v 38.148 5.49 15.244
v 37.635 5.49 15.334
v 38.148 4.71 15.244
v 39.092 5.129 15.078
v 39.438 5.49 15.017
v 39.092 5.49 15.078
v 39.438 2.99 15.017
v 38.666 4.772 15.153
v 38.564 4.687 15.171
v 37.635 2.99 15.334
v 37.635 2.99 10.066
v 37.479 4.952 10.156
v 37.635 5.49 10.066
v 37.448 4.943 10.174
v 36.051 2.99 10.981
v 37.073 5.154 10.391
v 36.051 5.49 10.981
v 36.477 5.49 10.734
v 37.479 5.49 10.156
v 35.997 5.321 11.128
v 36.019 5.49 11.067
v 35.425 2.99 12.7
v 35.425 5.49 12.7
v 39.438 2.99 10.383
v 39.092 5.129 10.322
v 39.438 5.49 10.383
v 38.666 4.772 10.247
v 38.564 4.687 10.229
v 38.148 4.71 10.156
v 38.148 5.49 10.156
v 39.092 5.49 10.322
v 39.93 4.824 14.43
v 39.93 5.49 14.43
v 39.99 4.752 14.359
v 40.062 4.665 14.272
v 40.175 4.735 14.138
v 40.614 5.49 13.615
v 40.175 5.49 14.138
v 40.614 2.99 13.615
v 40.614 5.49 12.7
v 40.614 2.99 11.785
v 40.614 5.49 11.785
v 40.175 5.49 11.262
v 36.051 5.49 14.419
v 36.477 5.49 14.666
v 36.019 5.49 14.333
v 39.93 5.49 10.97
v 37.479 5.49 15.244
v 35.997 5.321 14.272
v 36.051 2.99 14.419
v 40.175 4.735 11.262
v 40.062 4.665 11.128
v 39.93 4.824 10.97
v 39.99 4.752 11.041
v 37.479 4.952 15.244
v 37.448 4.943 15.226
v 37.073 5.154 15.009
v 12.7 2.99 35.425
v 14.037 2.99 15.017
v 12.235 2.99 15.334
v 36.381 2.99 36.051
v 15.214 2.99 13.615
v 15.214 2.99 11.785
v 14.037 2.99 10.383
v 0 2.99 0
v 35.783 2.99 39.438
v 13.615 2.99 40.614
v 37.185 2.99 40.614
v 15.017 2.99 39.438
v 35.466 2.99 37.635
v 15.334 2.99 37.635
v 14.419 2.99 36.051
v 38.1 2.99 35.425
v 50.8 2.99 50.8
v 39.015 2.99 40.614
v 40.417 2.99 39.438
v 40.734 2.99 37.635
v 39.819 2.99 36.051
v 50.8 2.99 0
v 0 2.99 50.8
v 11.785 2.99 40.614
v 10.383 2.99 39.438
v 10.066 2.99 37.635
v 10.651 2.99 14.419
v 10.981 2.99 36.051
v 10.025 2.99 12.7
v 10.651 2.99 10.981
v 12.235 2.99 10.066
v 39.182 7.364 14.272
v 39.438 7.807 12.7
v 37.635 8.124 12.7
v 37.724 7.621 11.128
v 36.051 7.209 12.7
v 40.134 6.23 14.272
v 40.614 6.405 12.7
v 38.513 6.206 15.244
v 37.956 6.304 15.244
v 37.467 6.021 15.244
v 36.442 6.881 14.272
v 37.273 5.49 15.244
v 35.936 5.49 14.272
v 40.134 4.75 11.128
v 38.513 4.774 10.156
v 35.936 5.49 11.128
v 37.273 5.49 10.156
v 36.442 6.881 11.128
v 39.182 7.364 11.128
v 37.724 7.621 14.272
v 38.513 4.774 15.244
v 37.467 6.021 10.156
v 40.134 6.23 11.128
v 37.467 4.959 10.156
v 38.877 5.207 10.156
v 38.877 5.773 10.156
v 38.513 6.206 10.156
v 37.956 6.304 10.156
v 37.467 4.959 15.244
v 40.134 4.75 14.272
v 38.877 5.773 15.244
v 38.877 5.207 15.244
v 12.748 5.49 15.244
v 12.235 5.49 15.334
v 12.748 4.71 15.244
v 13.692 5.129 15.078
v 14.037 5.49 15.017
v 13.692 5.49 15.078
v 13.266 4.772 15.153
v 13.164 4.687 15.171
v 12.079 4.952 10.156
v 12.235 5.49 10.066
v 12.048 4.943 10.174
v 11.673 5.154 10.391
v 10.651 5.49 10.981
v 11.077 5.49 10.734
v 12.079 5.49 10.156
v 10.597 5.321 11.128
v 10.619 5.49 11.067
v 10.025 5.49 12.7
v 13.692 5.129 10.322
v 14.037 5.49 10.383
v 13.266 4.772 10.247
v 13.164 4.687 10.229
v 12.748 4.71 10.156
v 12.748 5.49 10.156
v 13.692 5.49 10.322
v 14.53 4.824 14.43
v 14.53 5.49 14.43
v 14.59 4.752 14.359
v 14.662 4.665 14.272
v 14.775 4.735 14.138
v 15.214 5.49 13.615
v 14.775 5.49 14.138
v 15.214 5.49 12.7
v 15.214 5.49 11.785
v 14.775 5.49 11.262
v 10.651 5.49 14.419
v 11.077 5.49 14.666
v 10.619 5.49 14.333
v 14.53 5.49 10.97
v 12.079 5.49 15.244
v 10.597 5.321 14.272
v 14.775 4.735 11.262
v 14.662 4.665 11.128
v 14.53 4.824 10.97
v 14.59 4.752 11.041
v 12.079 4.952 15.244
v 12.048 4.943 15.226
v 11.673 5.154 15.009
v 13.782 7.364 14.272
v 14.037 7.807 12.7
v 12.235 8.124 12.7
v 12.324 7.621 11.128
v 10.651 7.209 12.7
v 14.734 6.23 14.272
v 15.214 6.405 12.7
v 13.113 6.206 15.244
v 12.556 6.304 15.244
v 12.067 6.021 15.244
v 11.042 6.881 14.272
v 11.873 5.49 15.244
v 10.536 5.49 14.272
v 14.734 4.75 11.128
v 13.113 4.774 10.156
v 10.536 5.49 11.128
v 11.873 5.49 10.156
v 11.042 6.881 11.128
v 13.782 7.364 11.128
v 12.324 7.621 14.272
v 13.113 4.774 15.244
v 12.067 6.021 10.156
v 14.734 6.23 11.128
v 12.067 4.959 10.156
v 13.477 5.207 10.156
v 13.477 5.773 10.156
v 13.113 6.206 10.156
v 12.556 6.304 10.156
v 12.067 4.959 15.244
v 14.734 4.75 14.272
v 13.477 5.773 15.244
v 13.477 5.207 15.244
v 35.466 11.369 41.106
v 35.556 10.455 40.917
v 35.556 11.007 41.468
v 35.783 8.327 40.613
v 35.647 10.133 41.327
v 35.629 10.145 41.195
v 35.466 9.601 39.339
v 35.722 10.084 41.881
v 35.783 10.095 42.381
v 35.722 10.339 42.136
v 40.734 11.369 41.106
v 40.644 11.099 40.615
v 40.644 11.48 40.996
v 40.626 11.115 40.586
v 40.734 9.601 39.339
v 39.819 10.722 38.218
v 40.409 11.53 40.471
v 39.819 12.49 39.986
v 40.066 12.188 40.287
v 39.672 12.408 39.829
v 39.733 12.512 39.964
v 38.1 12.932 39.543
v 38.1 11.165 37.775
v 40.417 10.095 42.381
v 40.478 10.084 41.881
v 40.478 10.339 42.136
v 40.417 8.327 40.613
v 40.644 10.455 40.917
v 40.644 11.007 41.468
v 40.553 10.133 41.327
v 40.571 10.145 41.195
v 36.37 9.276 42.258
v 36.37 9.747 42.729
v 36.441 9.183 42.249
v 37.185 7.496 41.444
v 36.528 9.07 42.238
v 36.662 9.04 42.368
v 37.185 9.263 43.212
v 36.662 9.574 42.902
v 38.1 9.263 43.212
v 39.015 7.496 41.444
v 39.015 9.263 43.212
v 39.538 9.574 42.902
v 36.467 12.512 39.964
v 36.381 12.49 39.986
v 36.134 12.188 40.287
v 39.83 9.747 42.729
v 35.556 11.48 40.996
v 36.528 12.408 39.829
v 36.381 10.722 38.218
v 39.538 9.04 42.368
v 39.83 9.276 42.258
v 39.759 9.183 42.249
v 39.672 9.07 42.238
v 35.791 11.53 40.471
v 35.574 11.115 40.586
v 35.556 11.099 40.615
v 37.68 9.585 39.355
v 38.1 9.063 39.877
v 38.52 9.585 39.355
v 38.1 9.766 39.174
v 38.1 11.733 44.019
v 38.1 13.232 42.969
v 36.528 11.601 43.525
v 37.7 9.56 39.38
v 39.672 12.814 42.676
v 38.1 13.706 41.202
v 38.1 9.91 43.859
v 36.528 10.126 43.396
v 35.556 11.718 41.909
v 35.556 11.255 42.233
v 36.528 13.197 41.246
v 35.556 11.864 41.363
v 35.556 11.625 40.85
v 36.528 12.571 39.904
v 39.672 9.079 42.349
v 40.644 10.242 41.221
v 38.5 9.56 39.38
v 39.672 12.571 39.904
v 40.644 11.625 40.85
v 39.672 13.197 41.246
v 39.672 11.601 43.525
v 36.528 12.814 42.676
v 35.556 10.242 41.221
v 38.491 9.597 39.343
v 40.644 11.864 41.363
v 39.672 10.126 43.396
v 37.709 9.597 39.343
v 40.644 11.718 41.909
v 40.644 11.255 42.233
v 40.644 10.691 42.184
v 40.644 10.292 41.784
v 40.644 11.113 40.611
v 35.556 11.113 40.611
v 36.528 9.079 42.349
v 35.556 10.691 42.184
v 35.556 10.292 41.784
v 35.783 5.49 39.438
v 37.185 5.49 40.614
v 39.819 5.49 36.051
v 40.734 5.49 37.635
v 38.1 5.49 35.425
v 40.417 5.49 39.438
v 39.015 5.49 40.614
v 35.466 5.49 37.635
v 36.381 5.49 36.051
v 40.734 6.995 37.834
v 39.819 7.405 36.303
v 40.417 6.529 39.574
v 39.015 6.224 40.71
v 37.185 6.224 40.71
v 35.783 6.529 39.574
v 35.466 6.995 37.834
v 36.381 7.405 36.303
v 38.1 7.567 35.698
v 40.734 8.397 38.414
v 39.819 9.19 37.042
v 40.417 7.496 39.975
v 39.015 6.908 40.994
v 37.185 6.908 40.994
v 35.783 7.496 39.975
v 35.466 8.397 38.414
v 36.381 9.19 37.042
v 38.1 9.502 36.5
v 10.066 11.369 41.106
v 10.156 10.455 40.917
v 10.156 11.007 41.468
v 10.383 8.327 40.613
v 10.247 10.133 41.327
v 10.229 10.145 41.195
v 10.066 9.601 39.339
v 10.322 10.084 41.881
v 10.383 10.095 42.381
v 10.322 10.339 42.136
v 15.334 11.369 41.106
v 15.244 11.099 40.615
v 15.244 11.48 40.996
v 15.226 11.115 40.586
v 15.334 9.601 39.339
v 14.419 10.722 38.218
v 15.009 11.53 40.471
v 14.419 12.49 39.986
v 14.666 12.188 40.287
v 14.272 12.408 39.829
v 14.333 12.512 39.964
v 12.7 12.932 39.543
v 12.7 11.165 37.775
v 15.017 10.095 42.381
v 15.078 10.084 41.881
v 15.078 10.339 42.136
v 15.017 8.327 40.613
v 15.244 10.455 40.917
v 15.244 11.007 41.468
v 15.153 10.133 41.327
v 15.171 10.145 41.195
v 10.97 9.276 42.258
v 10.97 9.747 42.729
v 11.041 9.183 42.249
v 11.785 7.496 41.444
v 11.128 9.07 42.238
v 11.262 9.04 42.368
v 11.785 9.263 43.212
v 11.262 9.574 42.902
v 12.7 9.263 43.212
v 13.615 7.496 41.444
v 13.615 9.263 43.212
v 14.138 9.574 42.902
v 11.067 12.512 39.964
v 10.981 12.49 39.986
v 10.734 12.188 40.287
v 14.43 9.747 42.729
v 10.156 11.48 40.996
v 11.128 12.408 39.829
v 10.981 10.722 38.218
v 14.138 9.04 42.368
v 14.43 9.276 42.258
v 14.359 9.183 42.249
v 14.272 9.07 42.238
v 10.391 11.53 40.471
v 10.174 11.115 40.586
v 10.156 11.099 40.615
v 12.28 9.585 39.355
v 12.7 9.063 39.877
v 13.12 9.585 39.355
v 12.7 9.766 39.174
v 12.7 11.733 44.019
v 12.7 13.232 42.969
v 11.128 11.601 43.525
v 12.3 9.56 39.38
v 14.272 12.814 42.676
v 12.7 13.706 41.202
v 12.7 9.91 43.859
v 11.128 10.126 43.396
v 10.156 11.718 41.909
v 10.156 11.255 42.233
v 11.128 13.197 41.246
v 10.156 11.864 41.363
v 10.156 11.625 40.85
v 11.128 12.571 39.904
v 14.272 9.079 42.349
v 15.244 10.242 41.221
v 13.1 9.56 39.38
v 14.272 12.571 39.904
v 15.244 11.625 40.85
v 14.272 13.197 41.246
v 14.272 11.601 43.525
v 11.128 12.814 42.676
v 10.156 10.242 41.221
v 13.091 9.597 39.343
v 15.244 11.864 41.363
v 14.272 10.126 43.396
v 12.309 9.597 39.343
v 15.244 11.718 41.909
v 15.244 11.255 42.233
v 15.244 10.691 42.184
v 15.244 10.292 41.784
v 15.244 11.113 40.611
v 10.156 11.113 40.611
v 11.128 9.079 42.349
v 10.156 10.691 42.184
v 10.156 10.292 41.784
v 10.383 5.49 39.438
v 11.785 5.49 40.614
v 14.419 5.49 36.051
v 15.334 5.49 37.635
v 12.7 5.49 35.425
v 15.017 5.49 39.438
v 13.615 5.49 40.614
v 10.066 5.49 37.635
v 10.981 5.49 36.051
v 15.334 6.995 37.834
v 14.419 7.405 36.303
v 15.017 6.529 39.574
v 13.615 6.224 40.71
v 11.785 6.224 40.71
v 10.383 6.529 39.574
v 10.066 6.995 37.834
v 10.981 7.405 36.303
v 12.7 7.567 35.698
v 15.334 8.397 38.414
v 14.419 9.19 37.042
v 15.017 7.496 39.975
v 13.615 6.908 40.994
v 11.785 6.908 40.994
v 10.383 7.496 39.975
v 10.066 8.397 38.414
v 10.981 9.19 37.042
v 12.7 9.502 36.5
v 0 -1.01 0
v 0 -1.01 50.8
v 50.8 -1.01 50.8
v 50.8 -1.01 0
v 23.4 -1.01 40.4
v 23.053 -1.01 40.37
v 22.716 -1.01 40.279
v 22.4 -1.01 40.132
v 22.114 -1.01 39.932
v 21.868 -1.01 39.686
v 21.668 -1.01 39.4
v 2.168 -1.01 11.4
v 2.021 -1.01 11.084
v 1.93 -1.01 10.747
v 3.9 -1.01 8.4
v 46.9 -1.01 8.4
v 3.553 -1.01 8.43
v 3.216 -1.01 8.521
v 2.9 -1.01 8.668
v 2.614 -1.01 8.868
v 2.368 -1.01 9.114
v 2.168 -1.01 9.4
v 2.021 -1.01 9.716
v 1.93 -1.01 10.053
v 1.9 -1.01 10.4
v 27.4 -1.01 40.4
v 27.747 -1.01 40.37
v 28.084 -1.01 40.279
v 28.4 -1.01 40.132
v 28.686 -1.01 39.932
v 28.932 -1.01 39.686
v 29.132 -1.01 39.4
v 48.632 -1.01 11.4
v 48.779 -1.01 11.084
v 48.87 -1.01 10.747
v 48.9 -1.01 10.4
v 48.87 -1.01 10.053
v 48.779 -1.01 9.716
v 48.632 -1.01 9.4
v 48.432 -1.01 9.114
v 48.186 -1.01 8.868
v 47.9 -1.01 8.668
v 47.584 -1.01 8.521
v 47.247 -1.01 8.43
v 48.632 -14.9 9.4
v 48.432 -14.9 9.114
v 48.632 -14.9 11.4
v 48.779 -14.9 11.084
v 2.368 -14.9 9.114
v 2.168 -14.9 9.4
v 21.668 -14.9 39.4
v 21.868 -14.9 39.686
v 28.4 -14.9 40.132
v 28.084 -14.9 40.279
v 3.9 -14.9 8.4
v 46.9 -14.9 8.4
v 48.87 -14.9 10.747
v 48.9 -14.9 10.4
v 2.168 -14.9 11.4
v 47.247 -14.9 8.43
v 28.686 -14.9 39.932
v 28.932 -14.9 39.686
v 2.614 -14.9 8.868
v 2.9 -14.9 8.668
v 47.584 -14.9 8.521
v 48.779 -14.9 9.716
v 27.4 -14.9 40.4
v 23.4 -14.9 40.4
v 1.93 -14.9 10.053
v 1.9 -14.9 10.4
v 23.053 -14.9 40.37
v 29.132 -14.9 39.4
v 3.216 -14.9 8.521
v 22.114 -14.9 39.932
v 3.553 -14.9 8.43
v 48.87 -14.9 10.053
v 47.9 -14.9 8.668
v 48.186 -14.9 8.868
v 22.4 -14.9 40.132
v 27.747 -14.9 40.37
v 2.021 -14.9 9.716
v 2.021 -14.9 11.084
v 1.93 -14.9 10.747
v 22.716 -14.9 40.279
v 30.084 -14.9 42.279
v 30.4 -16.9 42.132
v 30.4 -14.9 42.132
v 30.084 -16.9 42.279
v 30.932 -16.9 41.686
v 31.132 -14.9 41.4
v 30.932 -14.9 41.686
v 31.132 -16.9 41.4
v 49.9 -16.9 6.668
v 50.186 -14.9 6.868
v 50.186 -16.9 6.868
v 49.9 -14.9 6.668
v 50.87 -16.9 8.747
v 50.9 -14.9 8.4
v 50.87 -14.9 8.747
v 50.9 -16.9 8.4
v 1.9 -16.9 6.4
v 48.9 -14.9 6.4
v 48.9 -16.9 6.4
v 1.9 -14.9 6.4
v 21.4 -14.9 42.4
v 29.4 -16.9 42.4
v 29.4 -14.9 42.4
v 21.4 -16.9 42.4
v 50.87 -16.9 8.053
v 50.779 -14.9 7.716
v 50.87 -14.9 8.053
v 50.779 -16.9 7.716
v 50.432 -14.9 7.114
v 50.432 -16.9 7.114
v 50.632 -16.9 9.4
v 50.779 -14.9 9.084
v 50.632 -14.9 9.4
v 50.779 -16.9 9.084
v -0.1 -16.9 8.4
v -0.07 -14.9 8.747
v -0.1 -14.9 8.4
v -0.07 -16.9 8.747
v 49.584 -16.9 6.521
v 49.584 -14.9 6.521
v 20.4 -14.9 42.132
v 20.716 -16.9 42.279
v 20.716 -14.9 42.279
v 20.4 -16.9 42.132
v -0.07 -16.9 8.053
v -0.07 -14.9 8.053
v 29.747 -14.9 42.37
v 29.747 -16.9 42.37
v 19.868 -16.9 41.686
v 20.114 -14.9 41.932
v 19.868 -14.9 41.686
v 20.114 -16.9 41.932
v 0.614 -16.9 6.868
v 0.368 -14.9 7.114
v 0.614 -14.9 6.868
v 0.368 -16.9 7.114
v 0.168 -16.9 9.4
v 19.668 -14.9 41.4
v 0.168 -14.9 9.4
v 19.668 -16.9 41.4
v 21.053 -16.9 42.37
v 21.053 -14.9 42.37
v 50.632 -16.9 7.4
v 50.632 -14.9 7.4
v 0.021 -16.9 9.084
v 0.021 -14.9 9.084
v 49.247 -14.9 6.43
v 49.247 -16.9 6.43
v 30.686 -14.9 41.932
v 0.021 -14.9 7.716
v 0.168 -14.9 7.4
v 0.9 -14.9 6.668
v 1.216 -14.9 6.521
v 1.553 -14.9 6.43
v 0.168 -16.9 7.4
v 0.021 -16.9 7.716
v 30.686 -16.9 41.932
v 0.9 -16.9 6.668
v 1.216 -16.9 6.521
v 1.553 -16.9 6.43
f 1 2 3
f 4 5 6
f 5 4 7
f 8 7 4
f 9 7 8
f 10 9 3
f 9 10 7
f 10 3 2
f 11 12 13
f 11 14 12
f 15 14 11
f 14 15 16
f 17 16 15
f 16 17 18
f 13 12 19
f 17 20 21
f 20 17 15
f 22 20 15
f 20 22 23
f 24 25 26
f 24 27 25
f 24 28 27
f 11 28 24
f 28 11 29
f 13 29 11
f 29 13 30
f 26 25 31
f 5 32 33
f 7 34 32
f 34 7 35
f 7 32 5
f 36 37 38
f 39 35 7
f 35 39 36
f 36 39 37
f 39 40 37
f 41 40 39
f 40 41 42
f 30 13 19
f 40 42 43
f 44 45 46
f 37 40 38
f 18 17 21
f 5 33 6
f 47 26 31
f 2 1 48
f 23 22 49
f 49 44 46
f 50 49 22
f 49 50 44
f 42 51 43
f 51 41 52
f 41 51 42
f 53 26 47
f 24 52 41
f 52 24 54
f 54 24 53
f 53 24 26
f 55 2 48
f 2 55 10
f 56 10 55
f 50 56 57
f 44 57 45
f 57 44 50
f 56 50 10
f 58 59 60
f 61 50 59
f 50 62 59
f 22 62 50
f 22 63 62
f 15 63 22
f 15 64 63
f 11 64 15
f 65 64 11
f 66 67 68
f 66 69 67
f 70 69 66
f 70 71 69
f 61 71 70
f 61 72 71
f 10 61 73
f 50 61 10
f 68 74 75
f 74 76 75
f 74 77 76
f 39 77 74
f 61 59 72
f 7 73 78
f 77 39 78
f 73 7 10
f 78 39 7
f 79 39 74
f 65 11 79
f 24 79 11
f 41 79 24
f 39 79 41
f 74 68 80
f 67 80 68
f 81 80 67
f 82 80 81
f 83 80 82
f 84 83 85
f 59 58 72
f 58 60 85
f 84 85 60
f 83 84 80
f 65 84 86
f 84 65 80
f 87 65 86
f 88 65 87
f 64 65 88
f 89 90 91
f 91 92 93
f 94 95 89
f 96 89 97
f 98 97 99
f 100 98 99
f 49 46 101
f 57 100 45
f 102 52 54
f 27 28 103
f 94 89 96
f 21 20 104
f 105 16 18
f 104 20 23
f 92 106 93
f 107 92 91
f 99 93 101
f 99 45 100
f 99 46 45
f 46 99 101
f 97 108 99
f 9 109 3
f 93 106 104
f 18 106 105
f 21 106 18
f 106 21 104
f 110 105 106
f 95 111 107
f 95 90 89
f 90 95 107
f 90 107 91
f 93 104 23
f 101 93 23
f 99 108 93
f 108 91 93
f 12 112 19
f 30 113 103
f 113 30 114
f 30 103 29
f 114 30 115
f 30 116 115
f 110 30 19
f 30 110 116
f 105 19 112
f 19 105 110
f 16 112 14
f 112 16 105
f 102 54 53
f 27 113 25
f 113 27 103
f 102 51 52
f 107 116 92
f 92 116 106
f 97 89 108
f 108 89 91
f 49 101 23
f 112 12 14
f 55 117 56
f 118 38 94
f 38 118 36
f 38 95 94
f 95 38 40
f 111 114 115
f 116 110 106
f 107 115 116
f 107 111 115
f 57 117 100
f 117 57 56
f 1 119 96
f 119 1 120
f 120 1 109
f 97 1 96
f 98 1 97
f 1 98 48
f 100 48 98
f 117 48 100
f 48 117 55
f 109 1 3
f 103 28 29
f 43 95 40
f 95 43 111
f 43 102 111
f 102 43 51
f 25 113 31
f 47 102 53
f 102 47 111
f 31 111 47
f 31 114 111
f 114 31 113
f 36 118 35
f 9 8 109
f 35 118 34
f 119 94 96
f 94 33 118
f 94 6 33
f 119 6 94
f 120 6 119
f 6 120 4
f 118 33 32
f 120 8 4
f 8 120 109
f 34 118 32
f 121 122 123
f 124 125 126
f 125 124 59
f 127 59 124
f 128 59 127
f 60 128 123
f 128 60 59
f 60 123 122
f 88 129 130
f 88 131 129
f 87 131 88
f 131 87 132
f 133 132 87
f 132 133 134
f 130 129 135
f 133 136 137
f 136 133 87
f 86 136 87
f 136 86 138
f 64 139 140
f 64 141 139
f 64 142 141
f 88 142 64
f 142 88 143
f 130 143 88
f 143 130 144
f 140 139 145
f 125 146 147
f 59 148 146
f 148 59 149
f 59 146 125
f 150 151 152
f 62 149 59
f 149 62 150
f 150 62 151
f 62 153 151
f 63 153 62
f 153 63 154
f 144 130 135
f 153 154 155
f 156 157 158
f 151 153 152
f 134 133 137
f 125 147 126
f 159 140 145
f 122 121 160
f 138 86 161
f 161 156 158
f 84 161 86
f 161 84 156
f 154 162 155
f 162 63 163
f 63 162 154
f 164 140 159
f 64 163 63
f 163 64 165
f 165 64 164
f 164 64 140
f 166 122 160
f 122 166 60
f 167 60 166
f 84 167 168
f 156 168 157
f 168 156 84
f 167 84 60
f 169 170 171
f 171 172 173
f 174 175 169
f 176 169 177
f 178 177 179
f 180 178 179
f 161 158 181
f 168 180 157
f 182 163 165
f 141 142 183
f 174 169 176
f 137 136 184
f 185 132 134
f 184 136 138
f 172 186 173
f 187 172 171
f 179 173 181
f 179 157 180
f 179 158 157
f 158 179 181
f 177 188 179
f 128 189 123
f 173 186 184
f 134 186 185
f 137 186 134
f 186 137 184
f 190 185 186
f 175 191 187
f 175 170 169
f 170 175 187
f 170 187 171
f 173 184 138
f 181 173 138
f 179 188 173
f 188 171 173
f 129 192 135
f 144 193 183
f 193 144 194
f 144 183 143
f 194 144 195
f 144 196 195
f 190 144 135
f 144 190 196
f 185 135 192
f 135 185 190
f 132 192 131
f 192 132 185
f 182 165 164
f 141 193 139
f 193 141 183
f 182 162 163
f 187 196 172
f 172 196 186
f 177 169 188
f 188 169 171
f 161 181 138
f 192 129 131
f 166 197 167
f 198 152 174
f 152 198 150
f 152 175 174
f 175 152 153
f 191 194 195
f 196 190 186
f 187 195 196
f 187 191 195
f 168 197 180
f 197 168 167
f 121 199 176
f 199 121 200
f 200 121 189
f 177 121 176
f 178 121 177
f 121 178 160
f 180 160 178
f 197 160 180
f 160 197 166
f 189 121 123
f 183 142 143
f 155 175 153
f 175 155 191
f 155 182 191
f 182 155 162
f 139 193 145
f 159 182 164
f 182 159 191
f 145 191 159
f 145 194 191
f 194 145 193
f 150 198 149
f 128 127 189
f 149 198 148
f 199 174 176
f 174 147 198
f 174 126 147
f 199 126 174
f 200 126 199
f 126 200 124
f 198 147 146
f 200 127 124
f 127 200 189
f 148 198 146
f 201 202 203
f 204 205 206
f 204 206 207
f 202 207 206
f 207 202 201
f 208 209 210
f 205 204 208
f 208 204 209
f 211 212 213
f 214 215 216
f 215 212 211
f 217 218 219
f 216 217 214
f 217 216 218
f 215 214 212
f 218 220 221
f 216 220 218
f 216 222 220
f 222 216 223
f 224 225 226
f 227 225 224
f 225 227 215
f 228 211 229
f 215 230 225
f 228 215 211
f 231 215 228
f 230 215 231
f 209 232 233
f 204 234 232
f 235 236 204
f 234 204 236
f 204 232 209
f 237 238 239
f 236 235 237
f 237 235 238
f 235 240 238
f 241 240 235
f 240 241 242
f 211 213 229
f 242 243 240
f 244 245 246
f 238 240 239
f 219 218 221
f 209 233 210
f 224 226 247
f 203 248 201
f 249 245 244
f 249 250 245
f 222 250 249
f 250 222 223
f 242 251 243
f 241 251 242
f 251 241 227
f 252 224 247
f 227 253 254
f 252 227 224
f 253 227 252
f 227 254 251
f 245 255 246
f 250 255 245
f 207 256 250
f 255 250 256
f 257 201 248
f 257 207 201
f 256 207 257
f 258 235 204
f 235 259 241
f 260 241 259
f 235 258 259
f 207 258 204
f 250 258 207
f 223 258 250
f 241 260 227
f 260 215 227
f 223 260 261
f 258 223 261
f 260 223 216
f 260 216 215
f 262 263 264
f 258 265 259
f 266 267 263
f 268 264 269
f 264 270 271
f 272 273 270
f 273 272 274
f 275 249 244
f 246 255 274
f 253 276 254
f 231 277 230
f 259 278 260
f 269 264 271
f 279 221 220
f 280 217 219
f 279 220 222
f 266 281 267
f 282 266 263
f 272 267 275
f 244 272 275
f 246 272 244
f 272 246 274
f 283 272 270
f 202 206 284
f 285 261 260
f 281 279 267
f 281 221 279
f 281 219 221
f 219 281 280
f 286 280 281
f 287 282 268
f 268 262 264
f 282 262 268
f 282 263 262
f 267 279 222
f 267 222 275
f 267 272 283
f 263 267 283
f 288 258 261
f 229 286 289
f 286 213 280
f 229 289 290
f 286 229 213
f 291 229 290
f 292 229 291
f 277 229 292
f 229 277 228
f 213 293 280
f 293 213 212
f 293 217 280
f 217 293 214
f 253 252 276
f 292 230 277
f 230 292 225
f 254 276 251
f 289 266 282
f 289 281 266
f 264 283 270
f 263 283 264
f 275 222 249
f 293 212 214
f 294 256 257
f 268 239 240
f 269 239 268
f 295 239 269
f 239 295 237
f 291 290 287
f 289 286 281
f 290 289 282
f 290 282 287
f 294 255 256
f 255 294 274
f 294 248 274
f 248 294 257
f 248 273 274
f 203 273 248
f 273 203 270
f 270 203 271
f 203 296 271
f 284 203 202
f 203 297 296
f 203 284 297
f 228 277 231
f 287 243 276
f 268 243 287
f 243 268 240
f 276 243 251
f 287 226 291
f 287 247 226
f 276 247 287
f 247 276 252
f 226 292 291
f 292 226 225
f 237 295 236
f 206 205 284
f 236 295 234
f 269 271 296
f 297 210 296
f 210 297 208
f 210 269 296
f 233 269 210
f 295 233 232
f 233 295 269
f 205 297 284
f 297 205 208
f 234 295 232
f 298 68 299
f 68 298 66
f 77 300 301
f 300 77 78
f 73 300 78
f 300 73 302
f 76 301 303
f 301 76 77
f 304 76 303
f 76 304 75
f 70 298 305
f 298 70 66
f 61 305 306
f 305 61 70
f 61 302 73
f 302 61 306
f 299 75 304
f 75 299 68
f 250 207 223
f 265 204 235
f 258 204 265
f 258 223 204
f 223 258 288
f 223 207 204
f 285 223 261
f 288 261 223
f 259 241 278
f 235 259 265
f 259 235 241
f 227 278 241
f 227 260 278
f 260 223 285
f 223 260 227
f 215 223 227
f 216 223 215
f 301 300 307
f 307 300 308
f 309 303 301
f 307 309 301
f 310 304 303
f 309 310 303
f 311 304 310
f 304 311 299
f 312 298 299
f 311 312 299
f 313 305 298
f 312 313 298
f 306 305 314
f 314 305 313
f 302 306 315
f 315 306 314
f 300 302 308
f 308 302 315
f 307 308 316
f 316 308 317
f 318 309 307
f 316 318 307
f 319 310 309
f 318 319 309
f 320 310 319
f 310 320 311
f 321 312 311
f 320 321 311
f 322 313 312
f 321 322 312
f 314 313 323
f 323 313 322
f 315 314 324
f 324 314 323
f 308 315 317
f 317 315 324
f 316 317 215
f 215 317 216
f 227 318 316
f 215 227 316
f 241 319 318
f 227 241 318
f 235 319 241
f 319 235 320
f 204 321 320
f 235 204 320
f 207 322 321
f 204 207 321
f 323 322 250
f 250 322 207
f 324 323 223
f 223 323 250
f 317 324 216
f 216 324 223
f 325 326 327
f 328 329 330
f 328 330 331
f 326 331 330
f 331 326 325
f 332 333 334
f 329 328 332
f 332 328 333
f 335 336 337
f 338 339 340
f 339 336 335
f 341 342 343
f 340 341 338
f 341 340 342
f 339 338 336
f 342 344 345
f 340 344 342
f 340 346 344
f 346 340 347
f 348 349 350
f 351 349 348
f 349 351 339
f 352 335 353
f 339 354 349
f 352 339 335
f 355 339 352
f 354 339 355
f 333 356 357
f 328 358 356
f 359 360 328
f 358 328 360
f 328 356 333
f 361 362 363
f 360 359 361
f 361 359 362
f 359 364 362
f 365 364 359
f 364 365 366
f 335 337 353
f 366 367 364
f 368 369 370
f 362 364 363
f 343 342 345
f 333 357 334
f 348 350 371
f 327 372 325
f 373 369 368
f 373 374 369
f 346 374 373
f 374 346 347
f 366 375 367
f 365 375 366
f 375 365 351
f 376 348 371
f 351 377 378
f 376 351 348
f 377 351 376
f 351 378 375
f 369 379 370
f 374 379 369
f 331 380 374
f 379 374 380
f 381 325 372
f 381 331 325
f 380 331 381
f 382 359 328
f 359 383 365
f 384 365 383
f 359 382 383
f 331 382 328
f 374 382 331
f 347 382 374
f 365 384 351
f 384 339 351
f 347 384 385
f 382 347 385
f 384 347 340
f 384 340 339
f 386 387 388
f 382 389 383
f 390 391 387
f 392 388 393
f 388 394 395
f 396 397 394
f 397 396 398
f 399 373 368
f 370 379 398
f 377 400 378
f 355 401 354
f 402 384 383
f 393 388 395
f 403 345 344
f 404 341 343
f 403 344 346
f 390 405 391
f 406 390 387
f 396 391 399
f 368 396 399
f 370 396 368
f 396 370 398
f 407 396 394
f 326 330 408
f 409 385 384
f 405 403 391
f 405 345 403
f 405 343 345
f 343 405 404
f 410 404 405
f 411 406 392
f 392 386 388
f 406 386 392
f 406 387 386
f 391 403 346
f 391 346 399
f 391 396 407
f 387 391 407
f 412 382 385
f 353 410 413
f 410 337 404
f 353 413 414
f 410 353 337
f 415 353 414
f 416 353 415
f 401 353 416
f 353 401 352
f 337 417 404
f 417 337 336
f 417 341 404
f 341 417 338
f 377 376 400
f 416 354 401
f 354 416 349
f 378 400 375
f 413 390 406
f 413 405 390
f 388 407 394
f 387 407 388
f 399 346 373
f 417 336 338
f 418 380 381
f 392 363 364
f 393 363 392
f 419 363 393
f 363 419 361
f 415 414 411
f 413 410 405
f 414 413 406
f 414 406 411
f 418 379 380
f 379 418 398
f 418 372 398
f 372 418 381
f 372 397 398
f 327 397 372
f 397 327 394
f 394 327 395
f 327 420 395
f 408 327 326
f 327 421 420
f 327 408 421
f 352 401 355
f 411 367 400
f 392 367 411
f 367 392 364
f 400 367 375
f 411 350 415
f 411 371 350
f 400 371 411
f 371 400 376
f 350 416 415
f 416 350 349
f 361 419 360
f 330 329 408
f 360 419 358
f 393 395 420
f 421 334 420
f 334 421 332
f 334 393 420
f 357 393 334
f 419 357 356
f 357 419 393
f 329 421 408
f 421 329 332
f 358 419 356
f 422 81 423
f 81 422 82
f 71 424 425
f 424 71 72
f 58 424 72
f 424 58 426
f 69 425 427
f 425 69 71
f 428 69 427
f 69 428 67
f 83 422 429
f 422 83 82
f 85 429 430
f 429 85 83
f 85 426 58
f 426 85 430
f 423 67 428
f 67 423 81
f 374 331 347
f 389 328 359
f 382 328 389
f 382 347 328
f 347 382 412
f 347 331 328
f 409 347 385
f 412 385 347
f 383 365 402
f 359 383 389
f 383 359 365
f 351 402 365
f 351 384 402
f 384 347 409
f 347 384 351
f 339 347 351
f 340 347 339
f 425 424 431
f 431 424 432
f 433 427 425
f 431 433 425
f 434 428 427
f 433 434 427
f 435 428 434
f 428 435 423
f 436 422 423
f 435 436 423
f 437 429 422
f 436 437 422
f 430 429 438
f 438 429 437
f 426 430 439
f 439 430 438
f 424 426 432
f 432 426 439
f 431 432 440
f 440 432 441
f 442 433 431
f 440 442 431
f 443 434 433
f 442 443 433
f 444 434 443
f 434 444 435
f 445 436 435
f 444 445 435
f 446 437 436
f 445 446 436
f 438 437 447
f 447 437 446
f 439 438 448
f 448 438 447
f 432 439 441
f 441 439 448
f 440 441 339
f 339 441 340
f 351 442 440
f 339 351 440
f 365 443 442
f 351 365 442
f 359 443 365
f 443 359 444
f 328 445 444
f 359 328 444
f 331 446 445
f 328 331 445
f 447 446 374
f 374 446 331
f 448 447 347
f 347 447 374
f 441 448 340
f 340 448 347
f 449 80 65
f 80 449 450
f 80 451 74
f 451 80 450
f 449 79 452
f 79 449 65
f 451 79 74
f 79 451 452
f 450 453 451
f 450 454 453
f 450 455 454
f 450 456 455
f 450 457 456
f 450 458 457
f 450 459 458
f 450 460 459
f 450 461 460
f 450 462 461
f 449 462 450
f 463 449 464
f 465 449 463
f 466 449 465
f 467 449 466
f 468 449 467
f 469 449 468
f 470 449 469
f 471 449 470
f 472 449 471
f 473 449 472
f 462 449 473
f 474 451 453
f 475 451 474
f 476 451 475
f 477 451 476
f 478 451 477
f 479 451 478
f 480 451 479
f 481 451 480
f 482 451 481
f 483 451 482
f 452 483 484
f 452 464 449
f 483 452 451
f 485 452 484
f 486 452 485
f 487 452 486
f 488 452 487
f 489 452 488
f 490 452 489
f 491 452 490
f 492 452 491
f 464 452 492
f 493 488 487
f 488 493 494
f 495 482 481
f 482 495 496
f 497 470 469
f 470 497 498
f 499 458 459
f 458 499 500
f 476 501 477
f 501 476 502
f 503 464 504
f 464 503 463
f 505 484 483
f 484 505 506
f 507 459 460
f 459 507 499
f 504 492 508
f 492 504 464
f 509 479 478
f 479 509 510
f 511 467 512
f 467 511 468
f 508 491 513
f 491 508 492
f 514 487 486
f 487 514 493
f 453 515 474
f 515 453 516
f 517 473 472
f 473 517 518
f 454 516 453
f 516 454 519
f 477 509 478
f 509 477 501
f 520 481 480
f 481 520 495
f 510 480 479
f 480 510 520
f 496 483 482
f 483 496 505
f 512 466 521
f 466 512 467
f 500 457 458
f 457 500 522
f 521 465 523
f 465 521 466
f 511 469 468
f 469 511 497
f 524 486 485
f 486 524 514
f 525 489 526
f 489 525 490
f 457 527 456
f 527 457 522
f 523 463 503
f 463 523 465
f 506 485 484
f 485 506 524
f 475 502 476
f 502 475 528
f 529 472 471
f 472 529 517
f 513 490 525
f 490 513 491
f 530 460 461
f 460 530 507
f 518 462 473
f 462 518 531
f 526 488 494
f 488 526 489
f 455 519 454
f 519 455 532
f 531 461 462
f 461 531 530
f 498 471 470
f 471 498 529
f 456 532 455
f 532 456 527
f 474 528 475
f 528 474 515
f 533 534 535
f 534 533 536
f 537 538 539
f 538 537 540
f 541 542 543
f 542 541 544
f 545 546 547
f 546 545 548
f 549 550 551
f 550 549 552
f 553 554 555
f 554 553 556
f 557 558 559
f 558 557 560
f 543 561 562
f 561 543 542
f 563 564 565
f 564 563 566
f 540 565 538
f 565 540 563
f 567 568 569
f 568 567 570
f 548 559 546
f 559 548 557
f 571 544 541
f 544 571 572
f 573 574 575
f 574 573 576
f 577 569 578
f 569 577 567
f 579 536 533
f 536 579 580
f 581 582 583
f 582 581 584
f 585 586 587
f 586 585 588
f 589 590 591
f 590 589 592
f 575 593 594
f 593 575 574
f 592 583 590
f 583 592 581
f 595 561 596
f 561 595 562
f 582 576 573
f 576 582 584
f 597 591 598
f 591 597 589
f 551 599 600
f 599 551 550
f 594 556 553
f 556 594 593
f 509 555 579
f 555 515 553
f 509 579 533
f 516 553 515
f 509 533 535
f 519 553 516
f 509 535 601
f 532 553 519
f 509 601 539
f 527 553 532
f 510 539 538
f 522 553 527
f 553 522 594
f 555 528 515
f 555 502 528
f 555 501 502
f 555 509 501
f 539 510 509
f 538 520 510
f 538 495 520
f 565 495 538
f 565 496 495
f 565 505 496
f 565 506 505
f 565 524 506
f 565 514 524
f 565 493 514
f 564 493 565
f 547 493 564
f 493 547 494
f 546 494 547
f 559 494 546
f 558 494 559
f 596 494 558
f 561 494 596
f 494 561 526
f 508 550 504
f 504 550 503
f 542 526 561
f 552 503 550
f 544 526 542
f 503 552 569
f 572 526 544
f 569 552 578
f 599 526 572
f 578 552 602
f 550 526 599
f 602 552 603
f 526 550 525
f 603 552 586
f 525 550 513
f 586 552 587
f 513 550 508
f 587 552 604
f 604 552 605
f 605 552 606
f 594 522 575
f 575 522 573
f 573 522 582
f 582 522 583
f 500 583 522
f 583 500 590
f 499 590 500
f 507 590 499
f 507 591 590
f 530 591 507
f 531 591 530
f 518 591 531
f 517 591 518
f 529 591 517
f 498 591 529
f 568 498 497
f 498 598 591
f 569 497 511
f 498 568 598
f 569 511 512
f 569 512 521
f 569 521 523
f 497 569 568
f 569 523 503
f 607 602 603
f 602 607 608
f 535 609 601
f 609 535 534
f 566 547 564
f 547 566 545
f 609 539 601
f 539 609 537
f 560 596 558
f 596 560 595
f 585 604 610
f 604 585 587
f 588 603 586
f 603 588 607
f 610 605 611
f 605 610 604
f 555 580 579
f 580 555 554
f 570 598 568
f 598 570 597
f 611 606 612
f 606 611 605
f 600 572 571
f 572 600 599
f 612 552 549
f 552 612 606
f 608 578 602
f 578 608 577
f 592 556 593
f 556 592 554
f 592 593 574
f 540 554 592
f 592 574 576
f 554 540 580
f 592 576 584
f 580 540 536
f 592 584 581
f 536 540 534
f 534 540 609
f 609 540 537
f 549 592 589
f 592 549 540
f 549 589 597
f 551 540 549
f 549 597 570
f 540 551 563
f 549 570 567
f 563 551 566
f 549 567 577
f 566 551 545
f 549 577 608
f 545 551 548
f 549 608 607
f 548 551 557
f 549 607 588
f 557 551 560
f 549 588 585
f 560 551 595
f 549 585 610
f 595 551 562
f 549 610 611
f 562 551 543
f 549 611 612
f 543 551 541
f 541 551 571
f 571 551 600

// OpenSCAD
// file: Parametric_Pegboard_Base.scad
// FROM: https://www.thingiverse.com/thing:2583402

 // What size are the holes that we'll be going into?  Standard U.S. pegboard holes are 0.25" diameter
 hole_size = 0.25 * 25.4;

 // How far undersized should the pegs be to actually fit in the holes?
 peg_clearance = 0.25;

 // How thick is your pegboard?
 peg_height = 0.125 * 25.4;

 // What angle should the top pegs be bent at?
 peg_angle = 60;

 // Hole spacing.  Standard pegboard holes are 1" on center
 hole_center_to_center = 1 * 25.4;

 // How many rows of pegs?
 peg_rows = 2;

 // How many columns of pegs?
 peg_cols = 2;

 // How thick do you want the base?
 base_depth = 5;

 // ------------------- END PARAMETERS -----------------

//pegboard_base(peg_cols, peg_rows, hole_center_to_center, peg_height, base_depth, hole_size, peg_clearance, peg_angle);

//pegboard_base();

module pegboard_base(
cols = peg_cols,
rows = peg_rows,
spacing = hole_center_to_center,
height = peg_height,
depth = base_depth,
hole_size = hole_size,
clearance = peg_clearance,
angle = peg_angle)

{
    radius = hole_size / 2 - clearance;

    translate([spacing * (cols - 0.5), -depth, spacing / 2])
    rotate([180,180,0])
    {
        translate([-spacing / 2, -depth, -spacing / 2])
        cube([cols * spacing, depth, rows * spacing]);
        peg_grid(cols, rows, spacing, height, radius, angle);
    }
}

module peg_grid(cols, rows, spacing, height, radius, angle)
{
    for(row = [0 : rows - 2])
    {
        translate([0,0, row * spacing])
        peg_row(cols, spacing, height, radius);
    }

    translate([0, 0, (rows - 1) * spacing])
    top_peg_row(cols, spacing, height, radius, angle);
}

module top_peg_row(cols, spacing, height, radius, angle)
{
    peg_row(cols, spacing, height, radius, angle);
}

module peg_row(cols, spacing, height, radius, angle = 0)
{
    for(col = [0 : cols - 1])
    {
        translate([col * spacing, 0, 0])
        if(angle == 0) {
            rounded_peg(radius, height);
        } else {
            top_peg(radius, height, angle);
        }
    }
}

module top_peg(radius, height, angle = 60)
{
    rotate([0, 90, 0])
    {
        // Base peg
        peg(radius, height);

        // Bend
        translate([-2 * radius, height, 0])
        rotate_extrude2(angle = angle)
        translate([2 * radius, 0])
        circle(r = radius);

        // Extended peg
        translate([-2 * radius, height, 0])
        rotate([0,0,angle])
        translate([2 * radius, 0, 0])
        rounded_peg(radius, height);
        }
}

module rounded_peg(radius, height)
{
    peg(radius, height);
    translate([0, height, 0])
    sphere(r = radius);
}

module peg(radius, height)
{
    rotate([-90, 0, 0])
    cylinder(r = radius, h = height);
}

  //-------------- EXTERNAL MODULES -------------------

  // http://forum.openscad.org/rotate-extrude-angle-always-360-td19035.html
  module rotate_extrude2(angle=360, convexity=2, size=1000) {

  module angle_cut(angle=90,size=1000) {
    x = size*cos(angle/2);
    y = size*sin(angle/2);
    translate([0,0,-size])
      linear_extrude(2*size) polygon([[0,0],[x,y],[x,size],[-size,size],[-size,-size],[x,-size],[x,-y]]);
  }

  // support for angle parameter in rotate_extrude was added after release 2015.03
  // Thingiverse customizer is still on 2015.03
  angleSupport = (version_num() > 20150399) ? true : false; // Next openscad releases after 2015.03.xx will have support angle parameter
  // Using angle parameter when possible provides huge speed boost, avoids a difference operation

  if (angleSupport) {
    rotate_extrude(angle=angle,convexity=convexity)
      children();
  } else {
    rotate([0,0,angle/2]) difference() {
      rotate_extrude(convexity=convexity) children();
      angle_cut(angle, size);
    }
  }
}
// file: rounded_trapezoid.scad
$fn = 36;

module rounded_trapezoid(bottom_width, top_width, height, thickness, radius=2) {
  translate([0,thickness,0]) {
    rotate([90,0,0]) {
      hull() {
        // bottom left
        translate([radius, radius,0]) {
          cylinder(h=thickness, r=radius);
        }
        // bottom right
        translate([bottom_width - radius,radius,0]) {
          cylinder(h=thickness, r=radius);
        }
        // top left
        translate([((bottom_width - top_width) / 2) + radius, height - radius,0]) {
          cylinder(h=thickness, r=radius);
        }
        // top right
        translate([top_width + ((bottom_width - top_width) / 2) - radius,height - radius,0]) {
          cylinder(h=thickness, r=radius);
        }
      }
    }
  }
}
// main file
use <rounded_trapezoid.scad>;

// from: https://www.thingiverse.com/thing:2583402
use <Parametric_Pegboard_Base.scad>;

cols = 2;
base_width = 25.4 * cols;
base_height = 24.4 * 2;
corner_radius = 2;

translate([0,-1.01,0]){
  mirror([0,1,0]) {
    pegboard_base(cols, 2, clearance=0.5, height=2.5, angle=45, depth=4);
  }
}

xbottom = 47;
xtop = 8;
lip = 2;
depth = 15;
height = 32;

translate([(base_width - xbottom) / 2,-1 * depth,(base_height - height) / 2]) {
  rounded_trapezoid(bottom_width=xbottom, top_width=xtop, height=height, thickness=depth);
}
translate([(base_width - (xbottom + (lip * 2))) / 2,(-1 * depth) - (lip - 0.1),(base_height - (height + (lip * 2))) / 2]) {
  rounded_trapezoid(bottom_width=(xbottom + (lip * 2)), top_width=xtop + (lip * 2), height=(height + (lip * 2)), thickness=2);
}
